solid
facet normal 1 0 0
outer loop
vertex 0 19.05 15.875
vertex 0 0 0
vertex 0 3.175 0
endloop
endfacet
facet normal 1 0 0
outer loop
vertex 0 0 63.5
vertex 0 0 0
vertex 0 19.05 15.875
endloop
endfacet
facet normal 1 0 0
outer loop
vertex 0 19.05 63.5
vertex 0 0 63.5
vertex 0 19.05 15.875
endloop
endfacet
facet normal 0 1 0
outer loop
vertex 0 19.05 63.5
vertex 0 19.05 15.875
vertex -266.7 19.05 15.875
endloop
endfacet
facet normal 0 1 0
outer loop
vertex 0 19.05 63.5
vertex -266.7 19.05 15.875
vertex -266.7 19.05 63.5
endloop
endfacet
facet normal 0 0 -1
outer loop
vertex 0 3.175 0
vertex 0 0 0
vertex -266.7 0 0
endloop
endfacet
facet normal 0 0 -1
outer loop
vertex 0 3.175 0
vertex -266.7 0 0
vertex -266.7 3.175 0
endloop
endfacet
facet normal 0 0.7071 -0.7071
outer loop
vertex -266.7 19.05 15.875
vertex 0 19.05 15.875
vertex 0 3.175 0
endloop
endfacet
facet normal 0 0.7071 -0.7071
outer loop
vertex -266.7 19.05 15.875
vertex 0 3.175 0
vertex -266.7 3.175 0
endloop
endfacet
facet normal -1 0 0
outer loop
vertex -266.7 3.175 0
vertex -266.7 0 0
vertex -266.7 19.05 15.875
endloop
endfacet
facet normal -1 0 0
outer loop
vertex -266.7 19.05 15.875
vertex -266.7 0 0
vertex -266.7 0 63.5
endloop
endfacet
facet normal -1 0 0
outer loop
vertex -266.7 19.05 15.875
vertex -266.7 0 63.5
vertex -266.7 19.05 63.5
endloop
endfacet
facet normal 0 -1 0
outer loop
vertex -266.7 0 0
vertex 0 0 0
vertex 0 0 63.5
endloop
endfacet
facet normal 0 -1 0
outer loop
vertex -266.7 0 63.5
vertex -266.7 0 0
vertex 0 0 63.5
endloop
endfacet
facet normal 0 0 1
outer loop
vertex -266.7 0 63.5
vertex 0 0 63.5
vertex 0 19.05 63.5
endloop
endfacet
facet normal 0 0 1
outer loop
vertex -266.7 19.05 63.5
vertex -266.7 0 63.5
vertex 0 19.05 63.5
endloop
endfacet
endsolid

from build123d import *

# Parameters (mm, degrees)
F0_W     = 19.05
F0_H     = 63.5
F1_DEPTH = 266.7
F2_SIZE2 = 15.875
F2_SIZE  = 15.875


with BuildPart() as f1:
    # F0 (on Right) → F1 (new body)
    with BuildSketch(Plane.YZ):
        with Locations((9.525, 31.75)):
            Rectangle(F0_W, F0_H)
    extrude(amount=-F1_DEPTH)

    # F2
    f2_edges = [f1.edges().sort_by_distance(p)[0] for p in [
        (-133.35, 19.05, 0),
    ]]
    chamfer(f2_edges, length=F2_SIZE, length2=F2_SIZE2)


solid = f1.part
